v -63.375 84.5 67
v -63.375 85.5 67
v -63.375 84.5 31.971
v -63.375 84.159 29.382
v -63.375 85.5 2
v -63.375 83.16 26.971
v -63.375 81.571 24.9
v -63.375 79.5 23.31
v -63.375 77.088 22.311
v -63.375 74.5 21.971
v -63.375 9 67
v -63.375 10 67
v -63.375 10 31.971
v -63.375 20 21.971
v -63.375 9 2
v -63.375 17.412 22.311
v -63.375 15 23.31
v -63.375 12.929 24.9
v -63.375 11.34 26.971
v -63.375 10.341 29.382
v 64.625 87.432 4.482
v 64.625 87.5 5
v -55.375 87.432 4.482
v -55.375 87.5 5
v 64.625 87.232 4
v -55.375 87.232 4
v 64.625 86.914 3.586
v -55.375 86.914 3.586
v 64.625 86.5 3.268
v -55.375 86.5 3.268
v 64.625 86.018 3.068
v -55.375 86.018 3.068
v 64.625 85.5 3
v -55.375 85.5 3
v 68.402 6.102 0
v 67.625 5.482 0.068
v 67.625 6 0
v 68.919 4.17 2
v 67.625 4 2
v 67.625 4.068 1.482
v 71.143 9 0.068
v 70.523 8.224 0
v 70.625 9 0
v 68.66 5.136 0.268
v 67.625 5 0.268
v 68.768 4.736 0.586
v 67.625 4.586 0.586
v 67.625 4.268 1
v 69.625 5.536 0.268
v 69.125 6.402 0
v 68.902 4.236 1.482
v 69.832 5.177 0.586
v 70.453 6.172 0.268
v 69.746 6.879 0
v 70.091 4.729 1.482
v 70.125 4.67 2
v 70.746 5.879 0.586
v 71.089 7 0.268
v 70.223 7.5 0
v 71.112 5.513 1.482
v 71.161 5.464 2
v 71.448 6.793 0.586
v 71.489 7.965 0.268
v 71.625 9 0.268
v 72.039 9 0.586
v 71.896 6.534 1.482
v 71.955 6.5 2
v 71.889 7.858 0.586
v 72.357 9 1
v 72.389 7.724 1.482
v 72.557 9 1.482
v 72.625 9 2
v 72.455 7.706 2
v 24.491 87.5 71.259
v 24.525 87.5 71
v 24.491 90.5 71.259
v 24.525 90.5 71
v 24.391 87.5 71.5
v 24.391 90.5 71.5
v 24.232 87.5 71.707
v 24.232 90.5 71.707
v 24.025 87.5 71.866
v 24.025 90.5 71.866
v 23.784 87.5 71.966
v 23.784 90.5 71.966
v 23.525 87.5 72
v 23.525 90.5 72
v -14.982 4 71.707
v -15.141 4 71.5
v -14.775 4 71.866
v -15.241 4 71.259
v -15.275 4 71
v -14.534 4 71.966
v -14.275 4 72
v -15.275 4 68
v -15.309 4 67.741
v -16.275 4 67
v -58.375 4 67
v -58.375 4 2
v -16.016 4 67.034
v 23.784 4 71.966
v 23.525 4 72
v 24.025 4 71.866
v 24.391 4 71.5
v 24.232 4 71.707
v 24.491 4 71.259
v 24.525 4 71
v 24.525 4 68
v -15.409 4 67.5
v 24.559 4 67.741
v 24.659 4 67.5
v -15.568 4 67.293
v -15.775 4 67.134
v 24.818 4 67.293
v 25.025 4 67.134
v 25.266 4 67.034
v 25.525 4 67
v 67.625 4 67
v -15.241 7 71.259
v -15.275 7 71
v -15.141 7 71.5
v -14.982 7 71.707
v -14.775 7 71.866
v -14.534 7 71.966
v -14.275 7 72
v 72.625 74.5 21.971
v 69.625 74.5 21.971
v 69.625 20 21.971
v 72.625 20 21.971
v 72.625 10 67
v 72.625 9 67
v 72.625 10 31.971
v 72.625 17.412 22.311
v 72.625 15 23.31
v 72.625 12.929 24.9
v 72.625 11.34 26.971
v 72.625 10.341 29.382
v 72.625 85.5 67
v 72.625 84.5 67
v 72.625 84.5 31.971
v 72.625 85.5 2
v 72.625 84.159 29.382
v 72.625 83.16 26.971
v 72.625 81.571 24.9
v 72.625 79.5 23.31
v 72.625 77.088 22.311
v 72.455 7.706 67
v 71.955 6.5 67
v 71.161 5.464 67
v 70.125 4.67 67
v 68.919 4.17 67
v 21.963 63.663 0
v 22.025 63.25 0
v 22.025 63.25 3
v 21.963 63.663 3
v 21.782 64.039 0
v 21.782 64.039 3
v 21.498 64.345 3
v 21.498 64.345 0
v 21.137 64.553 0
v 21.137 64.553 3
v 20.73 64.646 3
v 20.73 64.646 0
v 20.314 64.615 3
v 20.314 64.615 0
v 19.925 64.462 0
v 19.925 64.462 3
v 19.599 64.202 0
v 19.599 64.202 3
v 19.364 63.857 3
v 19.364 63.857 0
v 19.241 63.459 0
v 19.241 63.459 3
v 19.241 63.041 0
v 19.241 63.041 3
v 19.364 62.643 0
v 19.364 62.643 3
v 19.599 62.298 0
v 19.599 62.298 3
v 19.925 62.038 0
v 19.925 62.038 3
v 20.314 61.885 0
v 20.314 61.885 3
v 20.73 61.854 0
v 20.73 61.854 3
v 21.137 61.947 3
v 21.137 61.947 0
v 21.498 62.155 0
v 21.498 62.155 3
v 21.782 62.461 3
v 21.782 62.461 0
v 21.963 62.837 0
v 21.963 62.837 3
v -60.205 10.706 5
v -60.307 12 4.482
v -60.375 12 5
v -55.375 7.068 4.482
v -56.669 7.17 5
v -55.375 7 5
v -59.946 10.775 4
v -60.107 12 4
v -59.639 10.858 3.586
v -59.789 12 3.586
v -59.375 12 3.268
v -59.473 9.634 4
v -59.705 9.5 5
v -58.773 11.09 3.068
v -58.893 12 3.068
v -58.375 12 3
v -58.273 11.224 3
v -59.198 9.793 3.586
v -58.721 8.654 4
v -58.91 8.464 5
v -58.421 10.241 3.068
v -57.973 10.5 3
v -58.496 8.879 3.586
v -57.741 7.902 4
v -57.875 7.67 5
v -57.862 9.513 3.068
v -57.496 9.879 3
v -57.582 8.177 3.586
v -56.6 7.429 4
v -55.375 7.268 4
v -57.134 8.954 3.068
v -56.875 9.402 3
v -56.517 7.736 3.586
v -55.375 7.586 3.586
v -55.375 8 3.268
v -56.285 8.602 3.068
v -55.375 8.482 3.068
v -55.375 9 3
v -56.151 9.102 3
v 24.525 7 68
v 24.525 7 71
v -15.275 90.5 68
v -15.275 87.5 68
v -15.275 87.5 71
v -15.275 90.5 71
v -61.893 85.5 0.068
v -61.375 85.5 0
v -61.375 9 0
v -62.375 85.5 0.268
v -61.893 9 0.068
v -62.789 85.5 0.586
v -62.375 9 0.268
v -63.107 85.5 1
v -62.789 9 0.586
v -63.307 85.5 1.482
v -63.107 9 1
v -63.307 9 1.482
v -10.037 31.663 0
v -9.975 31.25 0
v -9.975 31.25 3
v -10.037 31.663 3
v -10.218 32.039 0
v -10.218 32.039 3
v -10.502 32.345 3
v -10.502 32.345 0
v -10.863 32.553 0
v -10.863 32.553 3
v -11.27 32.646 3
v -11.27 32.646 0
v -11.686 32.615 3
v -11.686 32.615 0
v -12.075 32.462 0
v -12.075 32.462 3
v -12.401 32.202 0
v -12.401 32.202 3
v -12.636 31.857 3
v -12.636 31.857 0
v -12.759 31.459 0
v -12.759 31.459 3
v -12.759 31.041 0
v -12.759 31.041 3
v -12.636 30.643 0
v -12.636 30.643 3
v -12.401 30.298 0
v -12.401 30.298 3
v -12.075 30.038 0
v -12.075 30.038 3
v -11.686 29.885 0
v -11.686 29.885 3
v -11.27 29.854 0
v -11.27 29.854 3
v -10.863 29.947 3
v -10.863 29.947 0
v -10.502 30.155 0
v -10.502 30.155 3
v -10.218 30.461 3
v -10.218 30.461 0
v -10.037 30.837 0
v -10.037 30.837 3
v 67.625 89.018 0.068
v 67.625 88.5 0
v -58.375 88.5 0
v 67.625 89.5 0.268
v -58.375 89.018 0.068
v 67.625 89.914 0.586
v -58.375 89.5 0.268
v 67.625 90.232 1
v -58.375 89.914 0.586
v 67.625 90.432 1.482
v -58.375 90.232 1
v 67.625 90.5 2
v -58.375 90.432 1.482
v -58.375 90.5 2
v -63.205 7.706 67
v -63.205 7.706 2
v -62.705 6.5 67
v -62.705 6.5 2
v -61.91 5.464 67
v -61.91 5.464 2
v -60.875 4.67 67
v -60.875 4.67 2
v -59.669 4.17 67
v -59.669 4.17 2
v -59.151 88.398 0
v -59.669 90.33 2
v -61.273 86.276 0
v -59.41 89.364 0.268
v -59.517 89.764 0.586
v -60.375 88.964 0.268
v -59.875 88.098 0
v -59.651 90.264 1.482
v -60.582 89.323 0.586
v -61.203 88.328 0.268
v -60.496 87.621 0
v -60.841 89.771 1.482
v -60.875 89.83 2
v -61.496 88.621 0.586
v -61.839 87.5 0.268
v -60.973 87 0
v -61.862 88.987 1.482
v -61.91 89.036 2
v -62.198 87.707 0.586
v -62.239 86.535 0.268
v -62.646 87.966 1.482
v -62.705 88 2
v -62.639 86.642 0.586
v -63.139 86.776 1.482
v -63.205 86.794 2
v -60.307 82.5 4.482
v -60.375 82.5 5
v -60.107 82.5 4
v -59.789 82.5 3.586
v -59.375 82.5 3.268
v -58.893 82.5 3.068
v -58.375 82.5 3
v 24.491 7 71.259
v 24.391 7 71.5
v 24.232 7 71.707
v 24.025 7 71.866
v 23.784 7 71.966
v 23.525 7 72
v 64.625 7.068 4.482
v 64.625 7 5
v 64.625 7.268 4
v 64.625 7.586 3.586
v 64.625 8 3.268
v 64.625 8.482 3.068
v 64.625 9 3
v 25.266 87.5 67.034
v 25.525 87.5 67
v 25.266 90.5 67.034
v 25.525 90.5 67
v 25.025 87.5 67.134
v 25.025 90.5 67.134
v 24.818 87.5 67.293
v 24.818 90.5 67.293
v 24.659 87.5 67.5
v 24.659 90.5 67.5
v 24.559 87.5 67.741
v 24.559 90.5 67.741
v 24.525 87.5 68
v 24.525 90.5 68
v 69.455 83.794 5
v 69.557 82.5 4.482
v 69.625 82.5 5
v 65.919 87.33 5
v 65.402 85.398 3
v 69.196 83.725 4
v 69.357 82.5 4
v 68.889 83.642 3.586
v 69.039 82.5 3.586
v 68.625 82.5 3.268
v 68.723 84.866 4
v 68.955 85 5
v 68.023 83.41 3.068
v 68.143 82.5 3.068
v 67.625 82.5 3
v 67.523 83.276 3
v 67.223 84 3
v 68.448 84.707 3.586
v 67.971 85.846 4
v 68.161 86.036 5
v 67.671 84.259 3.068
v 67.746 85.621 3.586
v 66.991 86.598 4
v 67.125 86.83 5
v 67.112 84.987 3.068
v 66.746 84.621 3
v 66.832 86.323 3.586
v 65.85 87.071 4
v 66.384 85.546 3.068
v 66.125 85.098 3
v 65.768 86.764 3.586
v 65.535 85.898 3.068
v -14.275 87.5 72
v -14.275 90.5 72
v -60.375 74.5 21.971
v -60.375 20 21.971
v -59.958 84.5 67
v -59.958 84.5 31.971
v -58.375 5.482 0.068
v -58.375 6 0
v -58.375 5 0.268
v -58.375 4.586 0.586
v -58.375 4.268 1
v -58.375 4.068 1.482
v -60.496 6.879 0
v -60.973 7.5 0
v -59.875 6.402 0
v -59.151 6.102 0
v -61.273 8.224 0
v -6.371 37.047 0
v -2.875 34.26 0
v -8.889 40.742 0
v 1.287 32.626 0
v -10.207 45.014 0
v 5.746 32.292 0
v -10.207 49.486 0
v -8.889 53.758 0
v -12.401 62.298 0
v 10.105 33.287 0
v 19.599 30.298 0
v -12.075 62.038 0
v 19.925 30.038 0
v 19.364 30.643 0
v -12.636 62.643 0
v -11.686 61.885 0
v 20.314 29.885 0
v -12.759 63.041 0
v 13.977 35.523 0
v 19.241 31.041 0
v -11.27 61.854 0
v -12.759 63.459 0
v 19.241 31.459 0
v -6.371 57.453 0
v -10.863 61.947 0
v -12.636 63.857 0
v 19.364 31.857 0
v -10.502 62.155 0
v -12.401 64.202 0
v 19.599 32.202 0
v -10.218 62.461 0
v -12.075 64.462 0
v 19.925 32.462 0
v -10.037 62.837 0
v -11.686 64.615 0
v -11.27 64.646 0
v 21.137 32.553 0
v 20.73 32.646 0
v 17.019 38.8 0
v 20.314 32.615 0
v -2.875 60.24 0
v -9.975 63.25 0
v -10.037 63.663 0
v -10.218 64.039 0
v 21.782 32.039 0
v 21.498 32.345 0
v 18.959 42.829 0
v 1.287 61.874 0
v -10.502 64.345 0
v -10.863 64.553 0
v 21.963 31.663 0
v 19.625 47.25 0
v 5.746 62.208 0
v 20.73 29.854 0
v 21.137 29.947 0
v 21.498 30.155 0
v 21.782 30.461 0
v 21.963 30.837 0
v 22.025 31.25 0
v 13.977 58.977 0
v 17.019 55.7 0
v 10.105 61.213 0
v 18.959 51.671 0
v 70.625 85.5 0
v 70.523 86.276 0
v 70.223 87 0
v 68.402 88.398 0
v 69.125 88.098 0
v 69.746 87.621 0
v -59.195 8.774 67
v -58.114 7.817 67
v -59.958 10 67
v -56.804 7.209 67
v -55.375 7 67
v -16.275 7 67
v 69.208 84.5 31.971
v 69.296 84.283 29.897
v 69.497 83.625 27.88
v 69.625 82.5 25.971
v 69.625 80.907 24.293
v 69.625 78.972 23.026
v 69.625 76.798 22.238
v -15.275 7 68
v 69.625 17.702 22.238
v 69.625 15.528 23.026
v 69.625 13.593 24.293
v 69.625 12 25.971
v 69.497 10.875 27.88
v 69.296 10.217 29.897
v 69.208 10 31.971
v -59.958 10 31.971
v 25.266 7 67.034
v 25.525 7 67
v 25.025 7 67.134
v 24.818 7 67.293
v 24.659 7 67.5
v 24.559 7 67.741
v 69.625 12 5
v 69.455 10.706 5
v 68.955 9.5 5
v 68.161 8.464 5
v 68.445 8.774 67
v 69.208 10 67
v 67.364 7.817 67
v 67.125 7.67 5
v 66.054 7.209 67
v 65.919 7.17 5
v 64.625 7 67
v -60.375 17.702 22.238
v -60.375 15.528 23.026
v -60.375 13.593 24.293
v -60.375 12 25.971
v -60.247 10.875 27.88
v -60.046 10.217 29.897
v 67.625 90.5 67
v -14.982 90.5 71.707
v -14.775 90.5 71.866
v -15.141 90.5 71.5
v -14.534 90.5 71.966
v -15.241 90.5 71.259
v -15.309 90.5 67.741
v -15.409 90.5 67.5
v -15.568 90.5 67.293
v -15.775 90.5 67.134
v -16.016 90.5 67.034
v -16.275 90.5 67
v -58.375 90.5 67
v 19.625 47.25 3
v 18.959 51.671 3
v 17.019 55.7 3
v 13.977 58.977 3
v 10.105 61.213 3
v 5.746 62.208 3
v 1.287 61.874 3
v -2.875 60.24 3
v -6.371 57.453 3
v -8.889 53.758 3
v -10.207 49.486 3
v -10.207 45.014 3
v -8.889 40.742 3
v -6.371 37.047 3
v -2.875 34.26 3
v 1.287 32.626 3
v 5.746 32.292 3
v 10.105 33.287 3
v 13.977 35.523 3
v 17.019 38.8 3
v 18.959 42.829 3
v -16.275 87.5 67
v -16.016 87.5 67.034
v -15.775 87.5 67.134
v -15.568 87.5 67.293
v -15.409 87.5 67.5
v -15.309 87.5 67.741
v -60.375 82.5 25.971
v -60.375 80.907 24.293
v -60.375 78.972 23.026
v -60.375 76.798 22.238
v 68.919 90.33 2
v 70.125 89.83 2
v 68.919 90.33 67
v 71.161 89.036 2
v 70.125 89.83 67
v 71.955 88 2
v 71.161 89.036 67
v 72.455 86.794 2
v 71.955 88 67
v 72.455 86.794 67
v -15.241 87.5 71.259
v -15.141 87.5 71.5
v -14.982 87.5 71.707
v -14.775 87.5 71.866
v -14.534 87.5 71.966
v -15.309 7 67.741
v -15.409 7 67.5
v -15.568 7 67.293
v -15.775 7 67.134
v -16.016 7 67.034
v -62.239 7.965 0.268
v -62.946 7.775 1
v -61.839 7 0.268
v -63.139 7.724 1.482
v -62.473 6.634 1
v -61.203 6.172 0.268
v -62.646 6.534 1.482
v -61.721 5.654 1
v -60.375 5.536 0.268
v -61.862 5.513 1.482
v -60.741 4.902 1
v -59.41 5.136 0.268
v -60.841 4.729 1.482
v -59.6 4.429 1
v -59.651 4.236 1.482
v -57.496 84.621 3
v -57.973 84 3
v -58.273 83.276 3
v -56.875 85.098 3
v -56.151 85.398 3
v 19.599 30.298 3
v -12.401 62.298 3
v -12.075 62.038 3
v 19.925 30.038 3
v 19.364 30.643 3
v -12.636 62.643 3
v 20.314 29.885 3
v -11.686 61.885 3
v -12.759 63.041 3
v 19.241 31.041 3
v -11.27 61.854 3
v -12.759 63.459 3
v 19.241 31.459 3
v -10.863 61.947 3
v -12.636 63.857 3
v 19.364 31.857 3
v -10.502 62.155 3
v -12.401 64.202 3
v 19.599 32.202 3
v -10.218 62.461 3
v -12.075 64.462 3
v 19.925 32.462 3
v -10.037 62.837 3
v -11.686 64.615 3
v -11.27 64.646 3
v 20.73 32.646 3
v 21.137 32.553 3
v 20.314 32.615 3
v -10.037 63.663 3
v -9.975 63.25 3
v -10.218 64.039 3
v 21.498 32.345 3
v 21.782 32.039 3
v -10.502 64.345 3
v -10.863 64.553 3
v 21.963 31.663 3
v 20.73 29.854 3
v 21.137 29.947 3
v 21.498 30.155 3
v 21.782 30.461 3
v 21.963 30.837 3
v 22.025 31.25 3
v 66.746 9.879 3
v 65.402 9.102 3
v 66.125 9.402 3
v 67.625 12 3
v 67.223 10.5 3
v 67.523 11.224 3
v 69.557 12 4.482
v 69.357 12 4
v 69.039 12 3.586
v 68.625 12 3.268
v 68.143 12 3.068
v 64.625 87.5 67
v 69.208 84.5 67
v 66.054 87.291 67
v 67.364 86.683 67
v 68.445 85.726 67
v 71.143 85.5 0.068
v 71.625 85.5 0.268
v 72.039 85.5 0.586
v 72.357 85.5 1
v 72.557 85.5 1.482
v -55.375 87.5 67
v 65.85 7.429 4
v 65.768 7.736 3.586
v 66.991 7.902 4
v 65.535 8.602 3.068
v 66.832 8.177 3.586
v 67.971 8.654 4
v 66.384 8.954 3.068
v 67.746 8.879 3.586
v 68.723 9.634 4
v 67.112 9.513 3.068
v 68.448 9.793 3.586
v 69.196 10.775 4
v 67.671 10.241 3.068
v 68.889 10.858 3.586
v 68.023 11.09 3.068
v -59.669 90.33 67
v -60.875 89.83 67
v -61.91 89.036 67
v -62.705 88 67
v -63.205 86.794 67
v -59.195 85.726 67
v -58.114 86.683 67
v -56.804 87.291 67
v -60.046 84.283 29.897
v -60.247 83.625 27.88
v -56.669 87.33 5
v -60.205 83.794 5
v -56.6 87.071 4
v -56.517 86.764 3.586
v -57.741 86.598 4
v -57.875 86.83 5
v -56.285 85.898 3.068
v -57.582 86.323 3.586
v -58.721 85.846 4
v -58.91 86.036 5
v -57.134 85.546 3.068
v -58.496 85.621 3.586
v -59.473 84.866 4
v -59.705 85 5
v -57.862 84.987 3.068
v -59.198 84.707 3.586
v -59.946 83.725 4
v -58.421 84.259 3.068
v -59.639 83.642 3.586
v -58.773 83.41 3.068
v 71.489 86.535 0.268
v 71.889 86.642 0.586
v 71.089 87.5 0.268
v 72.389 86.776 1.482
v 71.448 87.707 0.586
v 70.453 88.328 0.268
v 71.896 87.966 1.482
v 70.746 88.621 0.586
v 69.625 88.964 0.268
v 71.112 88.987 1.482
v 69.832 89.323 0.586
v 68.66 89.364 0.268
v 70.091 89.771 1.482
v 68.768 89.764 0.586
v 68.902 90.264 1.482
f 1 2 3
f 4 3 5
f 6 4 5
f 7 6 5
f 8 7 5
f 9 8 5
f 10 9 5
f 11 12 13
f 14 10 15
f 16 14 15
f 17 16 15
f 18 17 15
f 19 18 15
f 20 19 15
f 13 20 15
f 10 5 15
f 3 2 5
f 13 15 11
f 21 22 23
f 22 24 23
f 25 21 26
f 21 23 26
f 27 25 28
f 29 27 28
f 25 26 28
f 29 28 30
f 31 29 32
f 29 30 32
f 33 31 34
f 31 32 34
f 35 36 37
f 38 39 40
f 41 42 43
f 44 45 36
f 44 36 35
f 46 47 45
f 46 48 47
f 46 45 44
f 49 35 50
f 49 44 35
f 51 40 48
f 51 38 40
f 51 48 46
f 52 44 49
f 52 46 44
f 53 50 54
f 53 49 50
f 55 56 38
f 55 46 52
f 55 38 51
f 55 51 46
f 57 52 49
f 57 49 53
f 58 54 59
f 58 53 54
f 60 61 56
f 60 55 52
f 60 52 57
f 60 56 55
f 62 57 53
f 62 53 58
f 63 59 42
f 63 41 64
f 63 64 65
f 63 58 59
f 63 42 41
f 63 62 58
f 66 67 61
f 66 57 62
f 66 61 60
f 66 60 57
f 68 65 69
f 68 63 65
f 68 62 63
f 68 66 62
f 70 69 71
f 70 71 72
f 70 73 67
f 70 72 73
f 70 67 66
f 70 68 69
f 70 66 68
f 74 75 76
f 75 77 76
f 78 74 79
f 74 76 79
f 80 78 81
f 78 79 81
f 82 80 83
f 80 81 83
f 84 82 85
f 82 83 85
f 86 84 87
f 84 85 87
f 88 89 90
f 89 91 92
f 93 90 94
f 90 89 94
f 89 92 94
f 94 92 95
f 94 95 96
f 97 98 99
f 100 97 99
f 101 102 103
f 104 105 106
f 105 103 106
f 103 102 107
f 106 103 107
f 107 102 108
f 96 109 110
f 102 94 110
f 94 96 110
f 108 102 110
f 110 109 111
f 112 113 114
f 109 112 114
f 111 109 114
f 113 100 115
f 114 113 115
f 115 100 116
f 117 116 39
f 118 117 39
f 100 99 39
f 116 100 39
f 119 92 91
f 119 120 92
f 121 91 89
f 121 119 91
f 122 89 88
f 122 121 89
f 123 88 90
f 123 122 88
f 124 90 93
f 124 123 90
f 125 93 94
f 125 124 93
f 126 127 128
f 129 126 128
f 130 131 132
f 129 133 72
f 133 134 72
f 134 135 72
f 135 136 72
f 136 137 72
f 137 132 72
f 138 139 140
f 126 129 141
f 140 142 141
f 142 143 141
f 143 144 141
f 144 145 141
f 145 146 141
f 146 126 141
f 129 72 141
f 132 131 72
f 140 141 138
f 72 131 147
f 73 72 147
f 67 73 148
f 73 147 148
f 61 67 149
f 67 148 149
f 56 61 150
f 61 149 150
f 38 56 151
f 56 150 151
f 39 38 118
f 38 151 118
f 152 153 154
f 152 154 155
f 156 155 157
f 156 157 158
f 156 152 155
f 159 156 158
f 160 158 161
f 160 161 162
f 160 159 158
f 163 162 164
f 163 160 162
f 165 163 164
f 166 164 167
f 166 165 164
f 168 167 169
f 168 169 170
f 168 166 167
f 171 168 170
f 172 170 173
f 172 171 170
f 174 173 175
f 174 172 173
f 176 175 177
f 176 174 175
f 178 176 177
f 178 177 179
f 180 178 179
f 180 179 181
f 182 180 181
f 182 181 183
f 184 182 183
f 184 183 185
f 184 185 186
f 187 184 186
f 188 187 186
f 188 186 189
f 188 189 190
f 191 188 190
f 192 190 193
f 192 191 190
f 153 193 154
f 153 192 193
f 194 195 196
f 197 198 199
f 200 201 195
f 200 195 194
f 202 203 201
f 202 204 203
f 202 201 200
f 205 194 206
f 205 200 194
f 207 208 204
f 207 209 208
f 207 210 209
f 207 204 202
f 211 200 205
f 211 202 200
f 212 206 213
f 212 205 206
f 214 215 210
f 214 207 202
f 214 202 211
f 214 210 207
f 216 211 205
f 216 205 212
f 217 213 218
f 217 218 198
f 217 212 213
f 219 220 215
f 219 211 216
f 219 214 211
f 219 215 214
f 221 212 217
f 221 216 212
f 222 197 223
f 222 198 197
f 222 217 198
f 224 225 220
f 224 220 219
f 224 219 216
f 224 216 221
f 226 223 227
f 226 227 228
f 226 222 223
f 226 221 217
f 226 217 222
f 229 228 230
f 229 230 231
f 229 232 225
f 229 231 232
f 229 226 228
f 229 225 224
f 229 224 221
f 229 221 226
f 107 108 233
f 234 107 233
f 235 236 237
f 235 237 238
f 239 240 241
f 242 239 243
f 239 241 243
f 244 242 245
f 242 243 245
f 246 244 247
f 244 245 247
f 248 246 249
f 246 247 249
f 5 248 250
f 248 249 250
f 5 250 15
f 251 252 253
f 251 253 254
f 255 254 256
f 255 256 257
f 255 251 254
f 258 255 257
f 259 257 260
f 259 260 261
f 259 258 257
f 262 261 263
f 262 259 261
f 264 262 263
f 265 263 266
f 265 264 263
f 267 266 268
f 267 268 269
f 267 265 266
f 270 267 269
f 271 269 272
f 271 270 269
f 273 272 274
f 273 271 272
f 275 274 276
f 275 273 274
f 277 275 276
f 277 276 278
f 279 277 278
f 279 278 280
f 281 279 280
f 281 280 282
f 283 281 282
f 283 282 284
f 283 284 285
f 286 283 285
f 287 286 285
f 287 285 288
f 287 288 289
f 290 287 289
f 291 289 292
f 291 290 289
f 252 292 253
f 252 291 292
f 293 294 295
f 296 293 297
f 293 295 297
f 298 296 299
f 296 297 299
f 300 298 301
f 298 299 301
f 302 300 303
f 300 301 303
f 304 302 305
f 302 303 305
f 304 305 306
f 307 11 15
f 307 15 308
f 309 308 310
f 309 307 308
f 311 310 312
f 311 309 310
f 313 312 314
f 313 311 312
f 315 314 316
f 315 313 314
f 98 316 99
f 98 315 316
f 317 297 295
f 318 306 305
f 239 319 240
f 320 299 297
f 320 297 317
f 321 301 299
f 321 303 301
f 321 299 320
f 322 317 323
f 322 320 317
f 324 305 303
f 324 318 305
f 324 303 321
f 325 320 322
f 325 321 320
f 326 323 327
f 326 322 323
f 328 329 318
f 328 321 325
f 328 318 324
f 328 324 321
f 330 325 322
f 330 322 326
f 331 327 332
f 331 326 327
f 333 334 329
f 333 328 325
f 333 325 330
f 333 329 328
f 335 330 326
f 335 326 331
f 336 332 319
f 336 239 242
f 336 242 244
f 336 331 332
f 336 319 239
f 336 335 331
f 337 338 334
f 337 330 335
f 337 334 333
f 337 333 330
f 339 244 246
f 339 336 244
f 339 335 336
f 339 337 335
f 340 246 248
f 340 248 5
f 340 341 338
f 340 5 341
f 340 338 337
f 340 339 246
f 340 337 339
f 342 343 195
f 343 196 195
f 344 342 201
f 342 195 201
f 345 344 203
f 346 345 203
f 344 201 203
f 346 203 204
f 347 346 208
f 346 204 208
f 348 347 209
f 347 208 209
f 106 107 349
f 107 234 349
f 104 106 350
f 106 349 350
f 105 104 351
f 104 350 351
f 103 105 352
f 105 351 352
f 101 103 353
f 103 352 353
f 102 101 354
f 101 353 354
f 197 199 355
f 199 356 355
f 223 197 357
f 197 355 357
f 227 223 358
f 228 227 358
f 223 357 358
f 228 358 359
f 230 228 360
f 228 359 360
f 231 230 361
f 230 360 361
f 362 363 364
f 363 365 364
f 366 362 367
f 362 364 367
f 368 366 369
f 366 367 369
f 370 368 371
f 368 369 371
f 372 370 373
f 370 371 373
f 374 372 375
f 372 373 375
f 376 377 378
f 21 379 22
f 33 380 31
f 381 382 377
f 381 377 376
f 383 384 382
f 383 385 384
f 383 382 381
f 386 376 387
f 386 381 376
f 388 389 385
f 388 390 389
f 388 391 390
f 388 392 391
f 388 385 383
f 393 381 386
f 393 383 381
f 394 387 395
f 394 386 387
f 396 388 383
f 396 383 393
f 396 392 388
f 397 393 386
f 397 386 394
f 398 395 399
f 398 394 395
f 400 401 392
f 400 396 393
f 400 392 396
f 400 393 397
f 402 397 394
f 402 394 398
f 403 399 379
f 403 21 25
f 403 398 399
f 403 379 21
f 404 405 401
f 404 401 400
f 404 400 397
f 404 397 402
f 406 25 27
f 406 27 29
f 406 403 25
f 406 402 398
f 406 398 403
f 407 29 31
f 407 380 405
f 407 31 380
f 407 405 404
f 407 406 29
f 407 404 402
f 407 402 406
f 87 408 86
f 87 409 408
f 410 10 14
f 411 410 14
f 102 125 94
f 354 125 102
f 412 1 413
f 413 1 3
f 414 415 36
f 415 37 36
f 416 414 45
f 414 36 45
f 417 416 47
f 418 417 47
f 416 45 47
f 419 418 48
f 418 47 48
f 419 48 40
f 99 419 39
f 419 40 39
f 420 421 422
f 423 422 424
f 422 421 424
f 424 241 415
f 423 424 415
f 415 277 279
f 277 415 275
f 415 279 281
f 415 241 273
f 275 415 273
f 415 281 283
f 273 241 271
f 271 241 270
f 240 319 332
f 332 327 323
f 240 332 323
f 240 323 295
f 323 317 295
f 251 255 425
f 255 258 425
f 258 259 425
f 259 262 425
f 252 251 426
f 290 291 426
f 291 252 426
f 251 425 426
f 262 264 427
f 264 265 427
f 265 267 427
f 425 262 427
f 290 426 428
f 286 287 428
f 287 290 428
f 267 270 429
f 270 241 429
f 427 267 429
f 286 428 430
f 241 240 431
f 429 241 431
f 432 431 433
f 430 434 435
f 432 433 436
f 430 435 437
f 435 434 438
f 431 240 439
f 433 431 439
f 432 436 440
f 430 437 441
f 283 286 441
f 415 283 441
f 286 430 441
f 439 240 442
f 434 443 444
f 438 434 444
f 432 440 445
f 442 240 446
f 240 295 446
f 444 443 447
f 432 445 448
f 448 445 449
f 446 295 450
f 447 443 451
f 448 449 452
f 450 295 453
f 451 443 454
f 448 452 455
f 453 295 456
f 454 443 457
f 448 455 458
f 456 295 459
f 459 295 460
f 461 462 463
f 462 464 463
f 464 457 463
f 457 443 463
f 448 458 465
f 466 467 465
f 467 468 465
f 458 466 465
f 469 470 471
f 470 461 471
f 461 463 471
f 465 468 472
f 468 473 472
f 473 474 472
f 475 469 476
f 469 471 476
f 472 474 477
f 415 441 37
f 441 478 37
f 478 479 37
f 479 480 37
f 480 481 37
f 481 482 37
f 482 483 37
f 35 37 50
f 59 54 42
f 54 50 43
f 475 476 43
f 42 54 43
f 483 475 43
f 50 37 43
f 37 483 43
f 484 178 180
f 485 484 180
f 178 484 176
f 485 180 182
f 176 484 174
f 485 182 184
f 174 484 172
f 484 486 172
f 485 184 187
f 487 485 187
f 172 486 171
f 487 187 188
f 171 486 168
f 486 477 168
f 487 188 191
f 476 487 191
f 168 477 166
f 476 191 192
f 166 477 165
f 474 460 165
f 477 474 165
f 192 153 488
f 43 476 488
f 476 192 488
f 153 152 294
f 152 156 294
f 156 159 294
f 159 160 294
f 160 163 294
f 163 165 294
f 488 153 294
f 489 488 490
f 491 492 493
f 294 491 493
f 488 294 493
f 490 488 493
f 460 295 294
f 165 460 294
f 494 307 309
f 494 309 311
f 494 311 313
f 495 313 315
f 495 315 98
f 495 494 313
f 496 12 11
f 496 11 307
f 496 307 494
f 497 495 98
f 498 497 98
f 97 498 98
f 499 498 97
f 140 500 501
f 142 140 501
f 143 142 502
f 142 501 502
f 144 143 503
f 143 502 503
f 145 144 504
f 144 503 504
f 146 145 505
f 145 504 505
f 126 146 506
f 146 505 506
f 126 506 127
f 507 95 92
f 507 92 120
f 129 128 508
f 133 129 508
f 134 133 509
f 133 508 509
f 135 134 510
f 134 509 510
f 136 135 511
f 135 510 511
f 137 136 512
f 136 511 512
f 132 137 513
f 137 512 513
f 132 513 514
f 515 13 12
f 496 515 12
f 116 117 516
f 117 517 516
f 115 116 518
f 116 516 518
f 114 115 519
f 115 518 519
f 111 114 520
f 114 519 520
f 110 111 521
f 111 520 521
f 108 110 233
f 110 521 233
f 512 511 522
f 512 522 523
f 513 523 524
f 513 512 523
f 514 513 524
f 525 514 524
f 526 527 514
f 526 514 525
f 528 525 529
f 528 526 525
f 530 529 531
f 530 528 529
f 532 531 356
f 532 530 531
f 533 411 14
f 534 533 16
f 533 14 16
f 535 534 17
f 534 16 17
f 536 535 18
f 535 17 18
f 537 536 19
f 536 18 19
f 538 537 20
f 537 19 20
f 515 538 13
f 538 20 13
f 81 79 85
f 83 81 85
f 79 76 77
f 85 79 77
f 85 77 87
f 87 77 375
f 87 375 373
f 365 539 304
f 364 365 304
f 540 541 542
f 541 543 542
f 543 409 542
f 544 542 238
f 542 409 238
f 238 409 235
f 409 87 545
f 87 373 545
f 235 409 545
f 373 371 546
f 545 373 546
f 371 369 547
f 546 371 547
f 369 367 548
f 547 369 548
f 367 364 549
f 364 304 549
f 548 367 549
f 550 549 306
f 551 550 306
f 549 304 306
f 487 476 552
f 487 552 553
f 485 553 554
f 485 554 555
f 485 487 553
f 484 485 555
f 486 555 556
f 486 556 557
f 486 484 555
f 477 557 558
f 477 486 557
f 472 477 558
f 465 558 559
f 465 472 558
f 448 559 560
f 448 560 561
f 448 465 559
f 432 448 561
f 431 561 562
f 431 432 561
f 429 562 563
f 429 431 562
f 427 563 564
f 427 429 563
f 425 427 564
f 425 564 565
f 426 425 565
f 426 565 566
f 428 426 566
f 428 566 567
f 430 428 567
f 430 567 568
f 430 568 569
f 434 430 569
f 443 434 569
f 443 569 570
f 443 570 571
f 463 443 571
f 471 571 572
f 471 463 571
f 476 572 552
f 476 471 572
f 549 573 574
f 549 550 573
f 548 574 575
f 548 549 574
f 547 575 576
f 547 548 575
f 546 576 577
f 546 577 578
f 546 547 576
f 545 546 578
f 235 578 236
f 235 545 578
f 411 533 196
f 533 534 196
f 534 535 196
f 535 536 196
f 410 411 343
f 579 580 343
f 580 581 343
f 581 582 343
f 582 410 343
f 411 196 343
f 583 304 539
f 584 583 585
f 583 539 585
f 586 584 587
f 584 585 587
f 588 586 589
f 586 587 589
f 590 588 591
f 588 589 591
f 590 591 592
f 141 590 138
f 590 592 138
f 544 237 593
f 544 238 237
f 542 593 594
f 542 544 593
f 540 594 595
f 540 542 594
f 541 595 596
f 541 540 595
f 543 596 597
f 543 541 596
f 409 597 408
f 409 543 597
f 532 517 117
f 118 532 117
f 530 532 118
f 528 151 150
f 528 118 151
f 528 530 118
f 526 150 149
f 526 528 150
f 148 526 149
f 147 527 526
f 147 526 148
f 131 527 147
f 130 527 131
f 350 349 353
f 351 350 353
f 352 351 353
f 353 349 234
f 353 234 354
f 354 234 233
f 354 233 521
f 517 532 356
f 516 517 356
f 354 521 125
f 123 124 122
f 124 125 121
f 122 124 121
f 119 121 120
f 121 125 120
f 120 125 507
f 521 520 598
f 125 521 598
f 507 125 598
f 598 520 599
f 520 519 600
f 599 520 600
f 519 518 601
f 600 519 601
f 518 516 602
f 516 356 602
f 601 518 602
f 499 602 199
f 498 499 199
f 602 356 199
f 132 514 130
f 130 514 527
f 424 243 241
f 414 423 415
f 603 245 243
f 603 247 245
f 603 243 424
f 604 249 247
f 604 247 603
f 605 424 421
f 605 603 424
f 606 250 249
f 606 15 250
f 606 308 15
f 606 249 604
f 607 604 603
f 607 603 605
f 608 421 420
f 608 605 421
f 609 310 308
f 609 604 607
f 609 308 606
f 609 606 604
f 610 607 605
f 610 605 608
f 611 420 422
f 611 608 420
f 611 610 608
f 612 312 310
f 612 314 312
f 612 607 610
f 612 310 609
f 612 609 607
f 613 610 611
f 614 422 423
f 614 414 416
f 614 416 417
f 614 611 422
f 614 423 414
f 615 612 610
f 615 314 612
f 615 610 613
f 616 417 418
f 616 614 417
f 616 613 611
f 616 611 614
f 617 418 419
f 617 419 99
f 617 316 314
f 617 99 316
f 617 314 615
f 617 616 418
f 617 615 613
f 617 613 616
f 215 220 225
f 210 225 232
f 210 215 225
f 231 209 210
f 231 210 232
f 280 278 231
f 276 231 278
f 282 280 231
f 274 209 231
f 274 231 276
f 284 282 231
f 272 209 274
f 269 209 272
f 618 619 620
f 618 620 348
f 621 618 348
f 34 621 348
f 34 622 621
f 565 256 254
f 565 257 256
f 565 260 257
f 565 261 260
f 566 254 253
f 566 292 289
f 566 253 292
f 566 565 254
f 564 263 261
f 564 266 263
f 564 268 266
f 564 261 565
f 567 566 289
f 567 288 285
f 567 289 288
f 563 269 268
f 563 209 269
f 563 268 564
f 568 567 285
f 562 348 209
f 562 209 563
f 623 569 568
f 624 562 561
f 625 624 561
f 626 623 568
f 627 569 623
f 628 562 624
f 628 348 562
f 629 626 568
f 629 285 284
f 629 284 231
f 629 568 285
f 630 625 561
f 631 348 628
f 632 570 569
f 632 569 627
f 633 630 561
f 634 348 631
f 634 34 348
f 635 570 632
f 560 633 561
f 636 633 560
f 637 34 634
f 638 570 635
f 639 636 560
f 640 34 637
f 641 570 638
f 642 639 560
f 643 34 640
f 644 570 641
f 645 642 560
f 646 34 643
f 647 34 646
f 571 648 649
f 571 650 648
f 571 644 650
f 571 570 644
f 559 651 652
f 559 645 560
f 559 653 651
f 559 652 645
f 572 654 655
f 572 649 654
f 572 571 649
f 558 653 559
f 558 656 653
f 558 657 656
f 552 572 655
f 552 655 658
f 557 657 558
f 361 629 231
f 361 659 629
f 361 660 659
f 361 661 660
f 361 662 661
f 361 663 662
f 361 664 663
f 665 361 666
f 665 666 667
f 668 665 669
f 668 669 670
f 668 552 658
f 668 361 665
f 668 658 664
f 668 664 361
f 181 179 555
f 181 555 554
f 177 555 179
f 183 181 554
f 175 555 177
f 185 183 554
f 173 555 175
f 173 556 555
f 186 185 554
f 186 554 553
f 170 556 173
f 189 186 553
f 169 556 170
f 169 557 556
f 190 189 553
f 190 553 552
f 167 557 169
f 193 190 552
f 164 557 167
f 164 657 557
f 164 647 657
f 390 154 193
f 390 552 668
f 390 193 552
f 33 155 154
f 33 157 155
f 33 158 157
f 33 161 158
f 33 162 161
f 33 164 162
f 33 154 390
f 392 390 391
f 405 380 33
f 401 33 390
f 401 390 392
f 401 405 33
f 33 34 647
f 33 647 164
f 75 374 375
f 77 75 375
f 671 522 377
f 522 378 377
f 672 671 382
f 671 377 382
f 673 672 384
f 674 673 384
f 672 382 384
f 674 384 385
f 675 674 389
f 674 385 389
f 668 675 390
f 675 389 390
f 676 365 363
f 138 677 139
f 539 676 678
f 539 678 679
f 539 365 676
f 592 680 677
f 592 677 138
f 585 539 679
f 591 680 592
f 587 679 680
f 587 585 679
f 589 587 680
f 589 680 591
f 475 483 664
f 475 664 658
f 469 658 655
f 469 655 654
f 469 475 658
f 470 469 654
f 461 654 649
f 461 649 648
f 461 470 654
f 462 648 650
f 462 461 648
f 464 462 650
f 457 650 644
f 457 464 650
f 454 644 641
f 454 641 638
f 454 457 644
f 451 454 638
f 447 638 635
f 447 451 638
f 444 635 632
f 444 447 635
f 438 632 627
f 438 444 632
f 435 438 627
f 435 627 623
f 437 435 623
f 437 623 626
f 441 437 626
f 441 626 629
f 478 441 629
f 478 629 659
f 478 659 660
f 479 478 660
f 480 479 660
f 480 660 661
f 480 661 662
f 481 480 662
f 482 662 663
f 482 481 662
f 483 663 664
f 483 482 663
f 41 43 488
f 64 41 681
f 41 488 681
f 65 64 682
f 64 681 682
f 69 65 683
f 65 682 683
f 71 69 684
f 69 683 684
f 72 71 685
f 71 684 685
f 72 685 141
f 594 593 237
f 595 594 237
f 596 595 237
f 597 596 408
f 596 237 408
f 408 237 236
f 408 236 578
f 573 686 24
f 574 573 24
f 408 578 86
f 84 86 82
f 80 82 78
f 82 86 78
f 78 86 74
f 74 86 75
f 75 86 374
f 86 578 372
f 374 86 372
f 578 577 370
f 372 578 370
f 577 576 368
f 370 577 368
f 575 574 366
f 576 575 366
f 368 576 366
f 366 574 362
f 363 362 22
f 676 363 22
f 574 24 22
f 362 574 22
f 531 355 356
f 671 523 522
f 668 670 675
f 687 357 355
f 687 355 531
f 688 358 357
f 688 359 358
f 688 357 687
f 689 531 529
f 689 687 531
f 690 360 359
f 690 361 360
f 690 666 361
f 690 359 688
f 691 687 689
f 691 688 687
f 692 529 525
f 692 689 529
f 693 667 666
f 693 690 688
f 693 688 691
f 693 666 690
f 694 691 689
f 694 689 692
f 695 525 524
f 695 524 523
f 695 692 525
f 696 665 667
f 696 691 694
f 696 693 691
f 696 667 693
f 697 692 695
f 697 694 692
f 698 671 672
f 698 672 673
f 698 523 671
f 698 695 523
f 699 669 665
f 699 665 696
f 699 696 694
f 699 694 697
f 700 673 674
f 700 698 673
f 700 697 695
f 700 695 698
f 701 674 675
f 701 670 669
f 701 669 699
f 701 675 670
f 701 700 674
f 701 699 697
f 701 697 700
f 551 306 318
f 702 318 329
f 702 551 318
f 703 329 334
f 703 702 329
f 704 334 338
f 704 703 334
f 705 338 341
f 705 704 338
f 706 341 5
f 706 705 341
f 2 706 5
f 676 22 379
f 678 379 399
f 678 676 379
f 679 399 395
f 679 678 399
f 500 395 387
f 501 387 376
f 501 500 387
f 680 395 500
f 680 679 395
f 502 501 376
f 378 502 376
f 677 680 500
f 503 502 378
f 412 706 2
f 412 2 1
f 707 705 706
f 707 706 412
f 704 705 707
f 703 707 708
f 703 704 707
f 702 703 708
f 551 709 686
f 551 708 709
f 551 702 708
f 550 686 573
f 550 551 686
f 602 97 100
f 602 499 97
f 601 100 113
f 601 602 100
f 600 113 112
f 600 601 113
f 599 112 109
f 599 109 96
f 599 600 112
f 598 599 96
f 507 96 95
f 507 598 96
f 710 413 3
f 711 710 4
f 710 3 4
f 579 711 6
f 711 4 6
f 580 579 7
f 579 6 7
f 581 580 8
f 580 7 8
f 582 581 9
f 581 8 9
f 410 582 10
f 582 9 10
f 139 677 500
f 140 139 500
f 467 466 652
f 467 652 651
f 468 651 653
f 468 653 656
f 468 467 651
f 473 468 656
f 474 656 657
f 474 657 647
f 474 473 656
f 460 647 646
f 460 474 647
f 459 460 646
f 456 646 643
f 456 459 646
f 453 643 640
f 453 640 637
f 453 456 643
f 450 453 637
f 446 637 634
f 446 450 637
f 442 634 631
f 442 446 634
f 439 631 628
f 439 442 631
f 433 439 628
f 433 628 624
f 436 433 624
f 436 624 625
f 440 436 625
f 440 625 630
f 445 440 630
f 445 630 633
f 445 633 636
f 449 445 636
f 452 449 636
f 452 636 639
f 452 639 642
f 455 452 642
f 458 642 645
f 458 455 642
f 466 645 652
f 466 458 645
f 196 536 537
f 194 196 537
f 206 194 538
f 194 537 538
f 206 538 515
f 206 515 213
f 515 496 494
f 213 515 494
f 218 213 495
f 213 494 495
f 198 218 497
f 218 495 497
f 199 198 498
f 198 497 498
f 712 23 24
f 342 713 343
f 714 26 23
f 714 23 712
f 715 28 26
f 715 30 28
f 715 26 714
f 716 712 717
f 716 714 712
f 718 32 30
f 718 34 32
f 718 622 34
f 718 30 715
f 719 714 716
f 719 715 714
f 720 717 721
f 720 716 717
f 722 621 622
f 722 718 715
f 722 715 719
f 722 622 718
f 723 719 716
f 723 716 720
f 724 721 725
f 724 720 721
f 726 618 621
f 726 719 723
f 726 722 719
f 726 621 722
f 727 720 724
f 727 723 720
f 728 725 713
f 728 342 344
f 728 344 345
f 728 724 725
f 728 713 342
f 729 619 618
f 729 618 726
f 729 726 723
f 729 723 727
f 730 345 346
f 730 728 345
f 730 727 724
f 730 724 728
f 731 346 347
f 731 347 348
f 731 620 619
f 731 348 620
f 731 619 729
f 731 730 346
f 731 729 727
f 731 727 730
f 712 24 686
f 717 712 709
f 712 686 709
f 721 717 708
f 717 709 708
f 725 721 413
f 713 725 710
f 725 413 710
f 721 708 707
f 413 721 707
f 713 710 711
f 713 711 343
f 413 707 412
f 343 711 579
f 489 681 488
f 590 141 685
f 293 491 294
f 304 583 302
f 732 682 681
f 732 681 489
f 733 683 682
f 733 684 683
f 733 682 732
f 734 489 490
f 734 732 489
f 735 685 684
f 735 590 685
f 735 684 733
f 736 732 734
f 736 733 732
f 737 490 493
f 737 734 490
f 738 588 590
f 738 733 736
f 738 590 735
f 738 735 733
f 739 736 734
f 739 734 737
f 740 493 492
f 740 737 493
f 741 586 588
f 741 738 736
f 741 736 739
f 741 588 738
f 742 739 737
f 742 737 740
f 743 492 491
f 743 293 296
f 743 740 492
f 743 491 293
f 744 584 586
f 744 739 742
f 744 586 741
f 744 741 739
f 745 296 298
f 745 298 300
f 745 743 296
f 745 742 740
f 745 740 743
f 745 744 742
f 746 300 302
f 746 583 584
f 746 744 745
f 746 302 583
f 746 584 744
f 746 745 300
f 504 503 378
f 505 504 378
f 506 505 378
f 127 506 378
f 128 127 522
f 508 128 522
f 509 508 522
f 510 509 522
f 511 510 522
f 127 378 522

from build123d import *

# Parameters (mm, degrees)
F0_R     = 3
F0_R_2   = 1.4
F0_R_3   = 15
F0_R_4   = 1.5
F1_DEPTH = 3
F0_W     = 65
F0_H     = 3
F2_DEPTH = 67
F4_DEPTH = 136.001
F5_W     = 39.8
F5_H     = 3
F6_W     = 39.8
F6_H     = 3
F7_DEPTH = 5
F8_R     = 1
F9_R     = 5
F10_R    = 2


# Not quite as in the source:
# - a feature names something its author has since deleted; it is built from what else it names


with BuildPart() as f1:
    # F0 (on Top) → F1 (new body)
    with BuildSketch(Plane.XY):
        Polygon((-60.3749420391, 27.6098903269), (-60.3749420391, 7), (-15.3749420391, 7), (-15.3749420391, 12), (24.6250579609, 12), (24.6250579609, 7), (69.6250579609, 7), (69.6250579609, 53.4099719524), (69.6250579609, 87.5), (4.6250579609, 87.5), (-60.3749420391, 87.5), (-60.3749420391, 71.25), align=None)
        with Locations((-30.3749420391, 23.25)):
            Circle(F0_R, mode=Mode.SUBTRACT)
        with Locations((-11.3749420391, 31.25)):
            Circle(F0_R_2, mode=Mode.SUBTRACT)
        with Locations((20.6250579609, 31.25)):
            Circle(F0_R_2, mode=Mode.SUBTRACT)
        with Locations((52.6250579609, 23.25)):
            Circle(F0_R, mode=Mode.SUBTRACT)
        with Locations((-11.3749420391, 63.25)):
            Circle(F0_R_2, mode=Mode.SUBTRACT)
        with BuildLine():
            ThreePointArc((-27.3749420391, 71.25), (-30.3749420391, 68.25), (-33.3749420391, 71.25))
            ThreePointArc((-33.3749420391, 71.25), (-30.3749420391, 74.25), (-27.3749420391, 71.25))
        make_face(mode=Mode.SUBTRACT)
        with Locations((4.6250579609, 47.25)):
            Circle(F0_R_3, mode=Mode.SUBTRACT)
        with Locations((20.6250579609, 63.25)):
            Circle(F0_R_2, mode=Mode.SUBTRACT)
        with Locations((52.6250579609, 71.25)):
            Circle(F0_R, mode=Mode.SUBTRACT)
        Polygon((-15.3749420391, 12), (-15.3749420391, 7), (14.8769766092, 7), (24.6250579609, 7), (24.6250579609, 12), align=None)
        with BuildLine():
            ThreePointArc((-27.3749420391, 71.25), (-30.3749420391, 74.25), (-33.3749420391, 71.25))
            ThreePointArc((-33.3749420391, 71.25), (-30.3749420391, 68.25), (-27.3749420391, 71.25))
        make_face()
        with BuildLine():
            ThreePointArc((-28.8749420391, 71.25), (-30.3749420391, 69.75), (-31.8749420391, 71.25))
            ThreePointArc((-31.8749420391, 71.25), (-30.3749420391, 72.75), (-28.8749420391, 71.25))
        make_face(mode=Mode.SUBTRACT)
        with BuildLine():
            ThreePointArc((-28.8749420391, 71.25), (-30.3749420391, 72.75), (-31.8749420391, 71.25))
            ThreePointArc((-31.8749420391, 71.25), (-30.3749420391, 69.75), (-28.8749420391, 71.25))
        make_face()
        with Locations((52.6250579609, 71.25)):
            Circle(F0_R)
        with Locations((52.6250579609, 71.25)):
            Circle(F0_R_4, mode=Mode.SUBTRACT)
        with Locations((52.6250579609, 71.25)):
            Circle(F0_R_4)
        with Locations((52.6250579609, 23.25)):
            Circle(F0_R)
        with Locations((52.6250579609, 23.25)):
            Circle(F0_R_4, mode=Mode.SUBTRACT)
        with Locations((52.6250579609, 23.25)):
            Circle(F0_R_4)
        with Locations((-30.3749420391, 23.25)):
            Circle(F0_R)
        with Locations((-30.3749420391, 23.25)):
            Circle(F0_R_4, mode=Mode.SUBTRACT)
        with Locations((-30.3749420391, 23.25)):
            Circle(F0_R_4)
    extrude(amount=F1_DEPTH)

    # F0 (on Top) → F2 (join)
    with BuildSketch(Plane.XY):
        Polygon((-63.3749420391, 27.6098903269), (-60.3749420391, 27.6098903269), (-60.3749420391, 71.25), (-60.3749420391, 87.5), (-60.3749420391, 90.5), (-63.3749420391, 90.5), align=None)
        with Locations((-27.8749420391, 89)):
            Rectangle(F0_W, F0_H)
        with Locations((37.1250579609, 89)):
            Rectangle(F0_W, F0_H)
        Polygon((69.6250579609, 87.5), (69.6250579609, 53.4099719524), (72.6250579609, 53.4099719524), (72.6250579609, 90.5), (69.6250579609, 90.5), align=None)
        Polygon((69.6250579609, 7), (69.6250579609, 4), (72.6250579609, 4), (72.6250579609, 53.4099719524), (69.6250579609, 53.4099719524), align=None)
        Polygon((14.8769766092, 4), (69.6250579609, 4), (69.6250579609, 7), (24.6250579609, 7), (14.8769766092, 7), align=None)
        Polygon((-60.3749420391, 7), (-60.3749420391, 4), (14.8769766092, 4), (14.8769766092, 7), (-15.3749420391, 7), align=None)
        Polygon((-63.3749420391, 4), (-60.3749420391, 4), (-60.3749420391, 7), (-60.3749420391, 27.6098903269), (-63.3749420391, 27.6098903269), align=None)
    extrude(amount=F2_DEPTH)

    # F3 (on face) → F4 (cut, through all)
    with BuildSketch(Plane(origin=(-63.3749420391, 0, 0), x_dir=(0, -1, 0), z_dir=(-1, 0, 0))):
        with BuildLine():
            ThreePointArc((-20, 21.9706685841), (-12.9289321881, 24.8996007722), (-10, 31.9706685841))
            ThreePointArc((-10, 31.9706685841), (-20, 41.9706685841), (-30, 31.9706685841))
            ThreePointArc((-30, 31.9706685841), (-27.0710678119, 24.8996007722), (-20, 21.9706685841))
        make_face()
        with BuildLine():
            ThreePointArc((-30, 31.9706685841), (-20, 41.9706685841), (-10, 31.9706685841))
            Line((-10, 31.9706685841), (-10, 67))
            Line((-10, 67), (-30, 67))
            Line((-30, 67), (-30, 31.9706685841))
        make_face()
        with BuildLine():
            ThreePointArc((-74.5, 21.9706685841), (-67.4289321881, 24.8996007722), (-64.5, 31.9706685841))
            ThreePointArc((-64.5, 31.9706685841), (-74.5, 41.9706685841), (-84.5, 31.9706685841))
            ThreePointArc((-84.5, 31.9706685841), (-81.5710678119, 24.8996007722), (-74.5, 21.9706685841))
        make_face()
        with BuildLine():
            Line((-64.5, 31.9706685841), (-30, 31.9706685841))
            Line((-30, 31.9706685841), (-30, 67))
            Line((-30, 67), (-84.5, 67))
            Line((-84.5, 67), (-84.5, 31.9706685841))
            ThreePointArc((-84.5, 31.9706685841), (-74.5, 41.9706685841), (-64.5, 31.9706685841))
        make_face()
        with BuildLine():
            ThreePointArc((-20, 21.9706685841), (-27.0710678119, 24.8996007722), (-30, 31.9706685841))
            Line((-30, 31.9706685841), (-64.5, 31.9706685841))
            ThreePointArc((-64.5, 31.9706685841), (-67.4289321881, 24.8996007722), (-74.5, 21.9706685841))
            Line((-74.5, 21.9706685841), (-20, 21.9706685841))
        make_face()
    extrude(amount=-F4_DEPTH, mode=Mode.SUBTRACT)

    # F5 (on face) + F6 (on face) → F7 (join)
    with BuildSketch(Plane.XY.offset(67)):
        with Locations((4.6250579609, 5.5)):
            Rectangle(F5_W, F5_H)
    with BuildSketch(Plane.XY.offset(67)):
        with Locations((4.6250579609, 89)):
            Rectangle(F6_W, F6_H)
    extrude(amount=F7_DEPTH)

    # F8
    f8_edges = [f1.edges().sort_by_distance(p)[0] for p in [
        (-15.274942, 5.5, 67),
        (-15.274942, 5.5, 72),
        (24.525058, 5.5, 72),
        (24.525058, 5.5, 67),
        (-15.274942, 89, 67),
        (-15.274942, 89, 72),
        (24.525058, 89, 72),
        (24.525058, 89, 67),
    ]]
    fillet(f8_edges, radius=F8_R)

    # F9
    f9_edges = [f1.edges().sort_by_distance(p)[0] for p in [
        (72.625058, 4, 33.5),
        (72.625058, 90.5, 33.5),
        (-63.374942, 90.5, 33.5),
        (-63.374942, 4, 33.5),
        (-60.374942, 7, 35),
        (-60.374942, 87.5, 35),
        (69.625058, 87.5, 35),
        (69.625058, 7, 35),
    ]]
    fillet(f9_edges, radius=F9_R)

    # F10
    f10_edges = [f1.edges().sort_by_distance(p)[0] for p in [
        (4.625058, 87.5, 3),
        (4.625058, 4, 0),
    ]]
    fillet(f10_edges, radius=F10_R)


solid = f1.part
